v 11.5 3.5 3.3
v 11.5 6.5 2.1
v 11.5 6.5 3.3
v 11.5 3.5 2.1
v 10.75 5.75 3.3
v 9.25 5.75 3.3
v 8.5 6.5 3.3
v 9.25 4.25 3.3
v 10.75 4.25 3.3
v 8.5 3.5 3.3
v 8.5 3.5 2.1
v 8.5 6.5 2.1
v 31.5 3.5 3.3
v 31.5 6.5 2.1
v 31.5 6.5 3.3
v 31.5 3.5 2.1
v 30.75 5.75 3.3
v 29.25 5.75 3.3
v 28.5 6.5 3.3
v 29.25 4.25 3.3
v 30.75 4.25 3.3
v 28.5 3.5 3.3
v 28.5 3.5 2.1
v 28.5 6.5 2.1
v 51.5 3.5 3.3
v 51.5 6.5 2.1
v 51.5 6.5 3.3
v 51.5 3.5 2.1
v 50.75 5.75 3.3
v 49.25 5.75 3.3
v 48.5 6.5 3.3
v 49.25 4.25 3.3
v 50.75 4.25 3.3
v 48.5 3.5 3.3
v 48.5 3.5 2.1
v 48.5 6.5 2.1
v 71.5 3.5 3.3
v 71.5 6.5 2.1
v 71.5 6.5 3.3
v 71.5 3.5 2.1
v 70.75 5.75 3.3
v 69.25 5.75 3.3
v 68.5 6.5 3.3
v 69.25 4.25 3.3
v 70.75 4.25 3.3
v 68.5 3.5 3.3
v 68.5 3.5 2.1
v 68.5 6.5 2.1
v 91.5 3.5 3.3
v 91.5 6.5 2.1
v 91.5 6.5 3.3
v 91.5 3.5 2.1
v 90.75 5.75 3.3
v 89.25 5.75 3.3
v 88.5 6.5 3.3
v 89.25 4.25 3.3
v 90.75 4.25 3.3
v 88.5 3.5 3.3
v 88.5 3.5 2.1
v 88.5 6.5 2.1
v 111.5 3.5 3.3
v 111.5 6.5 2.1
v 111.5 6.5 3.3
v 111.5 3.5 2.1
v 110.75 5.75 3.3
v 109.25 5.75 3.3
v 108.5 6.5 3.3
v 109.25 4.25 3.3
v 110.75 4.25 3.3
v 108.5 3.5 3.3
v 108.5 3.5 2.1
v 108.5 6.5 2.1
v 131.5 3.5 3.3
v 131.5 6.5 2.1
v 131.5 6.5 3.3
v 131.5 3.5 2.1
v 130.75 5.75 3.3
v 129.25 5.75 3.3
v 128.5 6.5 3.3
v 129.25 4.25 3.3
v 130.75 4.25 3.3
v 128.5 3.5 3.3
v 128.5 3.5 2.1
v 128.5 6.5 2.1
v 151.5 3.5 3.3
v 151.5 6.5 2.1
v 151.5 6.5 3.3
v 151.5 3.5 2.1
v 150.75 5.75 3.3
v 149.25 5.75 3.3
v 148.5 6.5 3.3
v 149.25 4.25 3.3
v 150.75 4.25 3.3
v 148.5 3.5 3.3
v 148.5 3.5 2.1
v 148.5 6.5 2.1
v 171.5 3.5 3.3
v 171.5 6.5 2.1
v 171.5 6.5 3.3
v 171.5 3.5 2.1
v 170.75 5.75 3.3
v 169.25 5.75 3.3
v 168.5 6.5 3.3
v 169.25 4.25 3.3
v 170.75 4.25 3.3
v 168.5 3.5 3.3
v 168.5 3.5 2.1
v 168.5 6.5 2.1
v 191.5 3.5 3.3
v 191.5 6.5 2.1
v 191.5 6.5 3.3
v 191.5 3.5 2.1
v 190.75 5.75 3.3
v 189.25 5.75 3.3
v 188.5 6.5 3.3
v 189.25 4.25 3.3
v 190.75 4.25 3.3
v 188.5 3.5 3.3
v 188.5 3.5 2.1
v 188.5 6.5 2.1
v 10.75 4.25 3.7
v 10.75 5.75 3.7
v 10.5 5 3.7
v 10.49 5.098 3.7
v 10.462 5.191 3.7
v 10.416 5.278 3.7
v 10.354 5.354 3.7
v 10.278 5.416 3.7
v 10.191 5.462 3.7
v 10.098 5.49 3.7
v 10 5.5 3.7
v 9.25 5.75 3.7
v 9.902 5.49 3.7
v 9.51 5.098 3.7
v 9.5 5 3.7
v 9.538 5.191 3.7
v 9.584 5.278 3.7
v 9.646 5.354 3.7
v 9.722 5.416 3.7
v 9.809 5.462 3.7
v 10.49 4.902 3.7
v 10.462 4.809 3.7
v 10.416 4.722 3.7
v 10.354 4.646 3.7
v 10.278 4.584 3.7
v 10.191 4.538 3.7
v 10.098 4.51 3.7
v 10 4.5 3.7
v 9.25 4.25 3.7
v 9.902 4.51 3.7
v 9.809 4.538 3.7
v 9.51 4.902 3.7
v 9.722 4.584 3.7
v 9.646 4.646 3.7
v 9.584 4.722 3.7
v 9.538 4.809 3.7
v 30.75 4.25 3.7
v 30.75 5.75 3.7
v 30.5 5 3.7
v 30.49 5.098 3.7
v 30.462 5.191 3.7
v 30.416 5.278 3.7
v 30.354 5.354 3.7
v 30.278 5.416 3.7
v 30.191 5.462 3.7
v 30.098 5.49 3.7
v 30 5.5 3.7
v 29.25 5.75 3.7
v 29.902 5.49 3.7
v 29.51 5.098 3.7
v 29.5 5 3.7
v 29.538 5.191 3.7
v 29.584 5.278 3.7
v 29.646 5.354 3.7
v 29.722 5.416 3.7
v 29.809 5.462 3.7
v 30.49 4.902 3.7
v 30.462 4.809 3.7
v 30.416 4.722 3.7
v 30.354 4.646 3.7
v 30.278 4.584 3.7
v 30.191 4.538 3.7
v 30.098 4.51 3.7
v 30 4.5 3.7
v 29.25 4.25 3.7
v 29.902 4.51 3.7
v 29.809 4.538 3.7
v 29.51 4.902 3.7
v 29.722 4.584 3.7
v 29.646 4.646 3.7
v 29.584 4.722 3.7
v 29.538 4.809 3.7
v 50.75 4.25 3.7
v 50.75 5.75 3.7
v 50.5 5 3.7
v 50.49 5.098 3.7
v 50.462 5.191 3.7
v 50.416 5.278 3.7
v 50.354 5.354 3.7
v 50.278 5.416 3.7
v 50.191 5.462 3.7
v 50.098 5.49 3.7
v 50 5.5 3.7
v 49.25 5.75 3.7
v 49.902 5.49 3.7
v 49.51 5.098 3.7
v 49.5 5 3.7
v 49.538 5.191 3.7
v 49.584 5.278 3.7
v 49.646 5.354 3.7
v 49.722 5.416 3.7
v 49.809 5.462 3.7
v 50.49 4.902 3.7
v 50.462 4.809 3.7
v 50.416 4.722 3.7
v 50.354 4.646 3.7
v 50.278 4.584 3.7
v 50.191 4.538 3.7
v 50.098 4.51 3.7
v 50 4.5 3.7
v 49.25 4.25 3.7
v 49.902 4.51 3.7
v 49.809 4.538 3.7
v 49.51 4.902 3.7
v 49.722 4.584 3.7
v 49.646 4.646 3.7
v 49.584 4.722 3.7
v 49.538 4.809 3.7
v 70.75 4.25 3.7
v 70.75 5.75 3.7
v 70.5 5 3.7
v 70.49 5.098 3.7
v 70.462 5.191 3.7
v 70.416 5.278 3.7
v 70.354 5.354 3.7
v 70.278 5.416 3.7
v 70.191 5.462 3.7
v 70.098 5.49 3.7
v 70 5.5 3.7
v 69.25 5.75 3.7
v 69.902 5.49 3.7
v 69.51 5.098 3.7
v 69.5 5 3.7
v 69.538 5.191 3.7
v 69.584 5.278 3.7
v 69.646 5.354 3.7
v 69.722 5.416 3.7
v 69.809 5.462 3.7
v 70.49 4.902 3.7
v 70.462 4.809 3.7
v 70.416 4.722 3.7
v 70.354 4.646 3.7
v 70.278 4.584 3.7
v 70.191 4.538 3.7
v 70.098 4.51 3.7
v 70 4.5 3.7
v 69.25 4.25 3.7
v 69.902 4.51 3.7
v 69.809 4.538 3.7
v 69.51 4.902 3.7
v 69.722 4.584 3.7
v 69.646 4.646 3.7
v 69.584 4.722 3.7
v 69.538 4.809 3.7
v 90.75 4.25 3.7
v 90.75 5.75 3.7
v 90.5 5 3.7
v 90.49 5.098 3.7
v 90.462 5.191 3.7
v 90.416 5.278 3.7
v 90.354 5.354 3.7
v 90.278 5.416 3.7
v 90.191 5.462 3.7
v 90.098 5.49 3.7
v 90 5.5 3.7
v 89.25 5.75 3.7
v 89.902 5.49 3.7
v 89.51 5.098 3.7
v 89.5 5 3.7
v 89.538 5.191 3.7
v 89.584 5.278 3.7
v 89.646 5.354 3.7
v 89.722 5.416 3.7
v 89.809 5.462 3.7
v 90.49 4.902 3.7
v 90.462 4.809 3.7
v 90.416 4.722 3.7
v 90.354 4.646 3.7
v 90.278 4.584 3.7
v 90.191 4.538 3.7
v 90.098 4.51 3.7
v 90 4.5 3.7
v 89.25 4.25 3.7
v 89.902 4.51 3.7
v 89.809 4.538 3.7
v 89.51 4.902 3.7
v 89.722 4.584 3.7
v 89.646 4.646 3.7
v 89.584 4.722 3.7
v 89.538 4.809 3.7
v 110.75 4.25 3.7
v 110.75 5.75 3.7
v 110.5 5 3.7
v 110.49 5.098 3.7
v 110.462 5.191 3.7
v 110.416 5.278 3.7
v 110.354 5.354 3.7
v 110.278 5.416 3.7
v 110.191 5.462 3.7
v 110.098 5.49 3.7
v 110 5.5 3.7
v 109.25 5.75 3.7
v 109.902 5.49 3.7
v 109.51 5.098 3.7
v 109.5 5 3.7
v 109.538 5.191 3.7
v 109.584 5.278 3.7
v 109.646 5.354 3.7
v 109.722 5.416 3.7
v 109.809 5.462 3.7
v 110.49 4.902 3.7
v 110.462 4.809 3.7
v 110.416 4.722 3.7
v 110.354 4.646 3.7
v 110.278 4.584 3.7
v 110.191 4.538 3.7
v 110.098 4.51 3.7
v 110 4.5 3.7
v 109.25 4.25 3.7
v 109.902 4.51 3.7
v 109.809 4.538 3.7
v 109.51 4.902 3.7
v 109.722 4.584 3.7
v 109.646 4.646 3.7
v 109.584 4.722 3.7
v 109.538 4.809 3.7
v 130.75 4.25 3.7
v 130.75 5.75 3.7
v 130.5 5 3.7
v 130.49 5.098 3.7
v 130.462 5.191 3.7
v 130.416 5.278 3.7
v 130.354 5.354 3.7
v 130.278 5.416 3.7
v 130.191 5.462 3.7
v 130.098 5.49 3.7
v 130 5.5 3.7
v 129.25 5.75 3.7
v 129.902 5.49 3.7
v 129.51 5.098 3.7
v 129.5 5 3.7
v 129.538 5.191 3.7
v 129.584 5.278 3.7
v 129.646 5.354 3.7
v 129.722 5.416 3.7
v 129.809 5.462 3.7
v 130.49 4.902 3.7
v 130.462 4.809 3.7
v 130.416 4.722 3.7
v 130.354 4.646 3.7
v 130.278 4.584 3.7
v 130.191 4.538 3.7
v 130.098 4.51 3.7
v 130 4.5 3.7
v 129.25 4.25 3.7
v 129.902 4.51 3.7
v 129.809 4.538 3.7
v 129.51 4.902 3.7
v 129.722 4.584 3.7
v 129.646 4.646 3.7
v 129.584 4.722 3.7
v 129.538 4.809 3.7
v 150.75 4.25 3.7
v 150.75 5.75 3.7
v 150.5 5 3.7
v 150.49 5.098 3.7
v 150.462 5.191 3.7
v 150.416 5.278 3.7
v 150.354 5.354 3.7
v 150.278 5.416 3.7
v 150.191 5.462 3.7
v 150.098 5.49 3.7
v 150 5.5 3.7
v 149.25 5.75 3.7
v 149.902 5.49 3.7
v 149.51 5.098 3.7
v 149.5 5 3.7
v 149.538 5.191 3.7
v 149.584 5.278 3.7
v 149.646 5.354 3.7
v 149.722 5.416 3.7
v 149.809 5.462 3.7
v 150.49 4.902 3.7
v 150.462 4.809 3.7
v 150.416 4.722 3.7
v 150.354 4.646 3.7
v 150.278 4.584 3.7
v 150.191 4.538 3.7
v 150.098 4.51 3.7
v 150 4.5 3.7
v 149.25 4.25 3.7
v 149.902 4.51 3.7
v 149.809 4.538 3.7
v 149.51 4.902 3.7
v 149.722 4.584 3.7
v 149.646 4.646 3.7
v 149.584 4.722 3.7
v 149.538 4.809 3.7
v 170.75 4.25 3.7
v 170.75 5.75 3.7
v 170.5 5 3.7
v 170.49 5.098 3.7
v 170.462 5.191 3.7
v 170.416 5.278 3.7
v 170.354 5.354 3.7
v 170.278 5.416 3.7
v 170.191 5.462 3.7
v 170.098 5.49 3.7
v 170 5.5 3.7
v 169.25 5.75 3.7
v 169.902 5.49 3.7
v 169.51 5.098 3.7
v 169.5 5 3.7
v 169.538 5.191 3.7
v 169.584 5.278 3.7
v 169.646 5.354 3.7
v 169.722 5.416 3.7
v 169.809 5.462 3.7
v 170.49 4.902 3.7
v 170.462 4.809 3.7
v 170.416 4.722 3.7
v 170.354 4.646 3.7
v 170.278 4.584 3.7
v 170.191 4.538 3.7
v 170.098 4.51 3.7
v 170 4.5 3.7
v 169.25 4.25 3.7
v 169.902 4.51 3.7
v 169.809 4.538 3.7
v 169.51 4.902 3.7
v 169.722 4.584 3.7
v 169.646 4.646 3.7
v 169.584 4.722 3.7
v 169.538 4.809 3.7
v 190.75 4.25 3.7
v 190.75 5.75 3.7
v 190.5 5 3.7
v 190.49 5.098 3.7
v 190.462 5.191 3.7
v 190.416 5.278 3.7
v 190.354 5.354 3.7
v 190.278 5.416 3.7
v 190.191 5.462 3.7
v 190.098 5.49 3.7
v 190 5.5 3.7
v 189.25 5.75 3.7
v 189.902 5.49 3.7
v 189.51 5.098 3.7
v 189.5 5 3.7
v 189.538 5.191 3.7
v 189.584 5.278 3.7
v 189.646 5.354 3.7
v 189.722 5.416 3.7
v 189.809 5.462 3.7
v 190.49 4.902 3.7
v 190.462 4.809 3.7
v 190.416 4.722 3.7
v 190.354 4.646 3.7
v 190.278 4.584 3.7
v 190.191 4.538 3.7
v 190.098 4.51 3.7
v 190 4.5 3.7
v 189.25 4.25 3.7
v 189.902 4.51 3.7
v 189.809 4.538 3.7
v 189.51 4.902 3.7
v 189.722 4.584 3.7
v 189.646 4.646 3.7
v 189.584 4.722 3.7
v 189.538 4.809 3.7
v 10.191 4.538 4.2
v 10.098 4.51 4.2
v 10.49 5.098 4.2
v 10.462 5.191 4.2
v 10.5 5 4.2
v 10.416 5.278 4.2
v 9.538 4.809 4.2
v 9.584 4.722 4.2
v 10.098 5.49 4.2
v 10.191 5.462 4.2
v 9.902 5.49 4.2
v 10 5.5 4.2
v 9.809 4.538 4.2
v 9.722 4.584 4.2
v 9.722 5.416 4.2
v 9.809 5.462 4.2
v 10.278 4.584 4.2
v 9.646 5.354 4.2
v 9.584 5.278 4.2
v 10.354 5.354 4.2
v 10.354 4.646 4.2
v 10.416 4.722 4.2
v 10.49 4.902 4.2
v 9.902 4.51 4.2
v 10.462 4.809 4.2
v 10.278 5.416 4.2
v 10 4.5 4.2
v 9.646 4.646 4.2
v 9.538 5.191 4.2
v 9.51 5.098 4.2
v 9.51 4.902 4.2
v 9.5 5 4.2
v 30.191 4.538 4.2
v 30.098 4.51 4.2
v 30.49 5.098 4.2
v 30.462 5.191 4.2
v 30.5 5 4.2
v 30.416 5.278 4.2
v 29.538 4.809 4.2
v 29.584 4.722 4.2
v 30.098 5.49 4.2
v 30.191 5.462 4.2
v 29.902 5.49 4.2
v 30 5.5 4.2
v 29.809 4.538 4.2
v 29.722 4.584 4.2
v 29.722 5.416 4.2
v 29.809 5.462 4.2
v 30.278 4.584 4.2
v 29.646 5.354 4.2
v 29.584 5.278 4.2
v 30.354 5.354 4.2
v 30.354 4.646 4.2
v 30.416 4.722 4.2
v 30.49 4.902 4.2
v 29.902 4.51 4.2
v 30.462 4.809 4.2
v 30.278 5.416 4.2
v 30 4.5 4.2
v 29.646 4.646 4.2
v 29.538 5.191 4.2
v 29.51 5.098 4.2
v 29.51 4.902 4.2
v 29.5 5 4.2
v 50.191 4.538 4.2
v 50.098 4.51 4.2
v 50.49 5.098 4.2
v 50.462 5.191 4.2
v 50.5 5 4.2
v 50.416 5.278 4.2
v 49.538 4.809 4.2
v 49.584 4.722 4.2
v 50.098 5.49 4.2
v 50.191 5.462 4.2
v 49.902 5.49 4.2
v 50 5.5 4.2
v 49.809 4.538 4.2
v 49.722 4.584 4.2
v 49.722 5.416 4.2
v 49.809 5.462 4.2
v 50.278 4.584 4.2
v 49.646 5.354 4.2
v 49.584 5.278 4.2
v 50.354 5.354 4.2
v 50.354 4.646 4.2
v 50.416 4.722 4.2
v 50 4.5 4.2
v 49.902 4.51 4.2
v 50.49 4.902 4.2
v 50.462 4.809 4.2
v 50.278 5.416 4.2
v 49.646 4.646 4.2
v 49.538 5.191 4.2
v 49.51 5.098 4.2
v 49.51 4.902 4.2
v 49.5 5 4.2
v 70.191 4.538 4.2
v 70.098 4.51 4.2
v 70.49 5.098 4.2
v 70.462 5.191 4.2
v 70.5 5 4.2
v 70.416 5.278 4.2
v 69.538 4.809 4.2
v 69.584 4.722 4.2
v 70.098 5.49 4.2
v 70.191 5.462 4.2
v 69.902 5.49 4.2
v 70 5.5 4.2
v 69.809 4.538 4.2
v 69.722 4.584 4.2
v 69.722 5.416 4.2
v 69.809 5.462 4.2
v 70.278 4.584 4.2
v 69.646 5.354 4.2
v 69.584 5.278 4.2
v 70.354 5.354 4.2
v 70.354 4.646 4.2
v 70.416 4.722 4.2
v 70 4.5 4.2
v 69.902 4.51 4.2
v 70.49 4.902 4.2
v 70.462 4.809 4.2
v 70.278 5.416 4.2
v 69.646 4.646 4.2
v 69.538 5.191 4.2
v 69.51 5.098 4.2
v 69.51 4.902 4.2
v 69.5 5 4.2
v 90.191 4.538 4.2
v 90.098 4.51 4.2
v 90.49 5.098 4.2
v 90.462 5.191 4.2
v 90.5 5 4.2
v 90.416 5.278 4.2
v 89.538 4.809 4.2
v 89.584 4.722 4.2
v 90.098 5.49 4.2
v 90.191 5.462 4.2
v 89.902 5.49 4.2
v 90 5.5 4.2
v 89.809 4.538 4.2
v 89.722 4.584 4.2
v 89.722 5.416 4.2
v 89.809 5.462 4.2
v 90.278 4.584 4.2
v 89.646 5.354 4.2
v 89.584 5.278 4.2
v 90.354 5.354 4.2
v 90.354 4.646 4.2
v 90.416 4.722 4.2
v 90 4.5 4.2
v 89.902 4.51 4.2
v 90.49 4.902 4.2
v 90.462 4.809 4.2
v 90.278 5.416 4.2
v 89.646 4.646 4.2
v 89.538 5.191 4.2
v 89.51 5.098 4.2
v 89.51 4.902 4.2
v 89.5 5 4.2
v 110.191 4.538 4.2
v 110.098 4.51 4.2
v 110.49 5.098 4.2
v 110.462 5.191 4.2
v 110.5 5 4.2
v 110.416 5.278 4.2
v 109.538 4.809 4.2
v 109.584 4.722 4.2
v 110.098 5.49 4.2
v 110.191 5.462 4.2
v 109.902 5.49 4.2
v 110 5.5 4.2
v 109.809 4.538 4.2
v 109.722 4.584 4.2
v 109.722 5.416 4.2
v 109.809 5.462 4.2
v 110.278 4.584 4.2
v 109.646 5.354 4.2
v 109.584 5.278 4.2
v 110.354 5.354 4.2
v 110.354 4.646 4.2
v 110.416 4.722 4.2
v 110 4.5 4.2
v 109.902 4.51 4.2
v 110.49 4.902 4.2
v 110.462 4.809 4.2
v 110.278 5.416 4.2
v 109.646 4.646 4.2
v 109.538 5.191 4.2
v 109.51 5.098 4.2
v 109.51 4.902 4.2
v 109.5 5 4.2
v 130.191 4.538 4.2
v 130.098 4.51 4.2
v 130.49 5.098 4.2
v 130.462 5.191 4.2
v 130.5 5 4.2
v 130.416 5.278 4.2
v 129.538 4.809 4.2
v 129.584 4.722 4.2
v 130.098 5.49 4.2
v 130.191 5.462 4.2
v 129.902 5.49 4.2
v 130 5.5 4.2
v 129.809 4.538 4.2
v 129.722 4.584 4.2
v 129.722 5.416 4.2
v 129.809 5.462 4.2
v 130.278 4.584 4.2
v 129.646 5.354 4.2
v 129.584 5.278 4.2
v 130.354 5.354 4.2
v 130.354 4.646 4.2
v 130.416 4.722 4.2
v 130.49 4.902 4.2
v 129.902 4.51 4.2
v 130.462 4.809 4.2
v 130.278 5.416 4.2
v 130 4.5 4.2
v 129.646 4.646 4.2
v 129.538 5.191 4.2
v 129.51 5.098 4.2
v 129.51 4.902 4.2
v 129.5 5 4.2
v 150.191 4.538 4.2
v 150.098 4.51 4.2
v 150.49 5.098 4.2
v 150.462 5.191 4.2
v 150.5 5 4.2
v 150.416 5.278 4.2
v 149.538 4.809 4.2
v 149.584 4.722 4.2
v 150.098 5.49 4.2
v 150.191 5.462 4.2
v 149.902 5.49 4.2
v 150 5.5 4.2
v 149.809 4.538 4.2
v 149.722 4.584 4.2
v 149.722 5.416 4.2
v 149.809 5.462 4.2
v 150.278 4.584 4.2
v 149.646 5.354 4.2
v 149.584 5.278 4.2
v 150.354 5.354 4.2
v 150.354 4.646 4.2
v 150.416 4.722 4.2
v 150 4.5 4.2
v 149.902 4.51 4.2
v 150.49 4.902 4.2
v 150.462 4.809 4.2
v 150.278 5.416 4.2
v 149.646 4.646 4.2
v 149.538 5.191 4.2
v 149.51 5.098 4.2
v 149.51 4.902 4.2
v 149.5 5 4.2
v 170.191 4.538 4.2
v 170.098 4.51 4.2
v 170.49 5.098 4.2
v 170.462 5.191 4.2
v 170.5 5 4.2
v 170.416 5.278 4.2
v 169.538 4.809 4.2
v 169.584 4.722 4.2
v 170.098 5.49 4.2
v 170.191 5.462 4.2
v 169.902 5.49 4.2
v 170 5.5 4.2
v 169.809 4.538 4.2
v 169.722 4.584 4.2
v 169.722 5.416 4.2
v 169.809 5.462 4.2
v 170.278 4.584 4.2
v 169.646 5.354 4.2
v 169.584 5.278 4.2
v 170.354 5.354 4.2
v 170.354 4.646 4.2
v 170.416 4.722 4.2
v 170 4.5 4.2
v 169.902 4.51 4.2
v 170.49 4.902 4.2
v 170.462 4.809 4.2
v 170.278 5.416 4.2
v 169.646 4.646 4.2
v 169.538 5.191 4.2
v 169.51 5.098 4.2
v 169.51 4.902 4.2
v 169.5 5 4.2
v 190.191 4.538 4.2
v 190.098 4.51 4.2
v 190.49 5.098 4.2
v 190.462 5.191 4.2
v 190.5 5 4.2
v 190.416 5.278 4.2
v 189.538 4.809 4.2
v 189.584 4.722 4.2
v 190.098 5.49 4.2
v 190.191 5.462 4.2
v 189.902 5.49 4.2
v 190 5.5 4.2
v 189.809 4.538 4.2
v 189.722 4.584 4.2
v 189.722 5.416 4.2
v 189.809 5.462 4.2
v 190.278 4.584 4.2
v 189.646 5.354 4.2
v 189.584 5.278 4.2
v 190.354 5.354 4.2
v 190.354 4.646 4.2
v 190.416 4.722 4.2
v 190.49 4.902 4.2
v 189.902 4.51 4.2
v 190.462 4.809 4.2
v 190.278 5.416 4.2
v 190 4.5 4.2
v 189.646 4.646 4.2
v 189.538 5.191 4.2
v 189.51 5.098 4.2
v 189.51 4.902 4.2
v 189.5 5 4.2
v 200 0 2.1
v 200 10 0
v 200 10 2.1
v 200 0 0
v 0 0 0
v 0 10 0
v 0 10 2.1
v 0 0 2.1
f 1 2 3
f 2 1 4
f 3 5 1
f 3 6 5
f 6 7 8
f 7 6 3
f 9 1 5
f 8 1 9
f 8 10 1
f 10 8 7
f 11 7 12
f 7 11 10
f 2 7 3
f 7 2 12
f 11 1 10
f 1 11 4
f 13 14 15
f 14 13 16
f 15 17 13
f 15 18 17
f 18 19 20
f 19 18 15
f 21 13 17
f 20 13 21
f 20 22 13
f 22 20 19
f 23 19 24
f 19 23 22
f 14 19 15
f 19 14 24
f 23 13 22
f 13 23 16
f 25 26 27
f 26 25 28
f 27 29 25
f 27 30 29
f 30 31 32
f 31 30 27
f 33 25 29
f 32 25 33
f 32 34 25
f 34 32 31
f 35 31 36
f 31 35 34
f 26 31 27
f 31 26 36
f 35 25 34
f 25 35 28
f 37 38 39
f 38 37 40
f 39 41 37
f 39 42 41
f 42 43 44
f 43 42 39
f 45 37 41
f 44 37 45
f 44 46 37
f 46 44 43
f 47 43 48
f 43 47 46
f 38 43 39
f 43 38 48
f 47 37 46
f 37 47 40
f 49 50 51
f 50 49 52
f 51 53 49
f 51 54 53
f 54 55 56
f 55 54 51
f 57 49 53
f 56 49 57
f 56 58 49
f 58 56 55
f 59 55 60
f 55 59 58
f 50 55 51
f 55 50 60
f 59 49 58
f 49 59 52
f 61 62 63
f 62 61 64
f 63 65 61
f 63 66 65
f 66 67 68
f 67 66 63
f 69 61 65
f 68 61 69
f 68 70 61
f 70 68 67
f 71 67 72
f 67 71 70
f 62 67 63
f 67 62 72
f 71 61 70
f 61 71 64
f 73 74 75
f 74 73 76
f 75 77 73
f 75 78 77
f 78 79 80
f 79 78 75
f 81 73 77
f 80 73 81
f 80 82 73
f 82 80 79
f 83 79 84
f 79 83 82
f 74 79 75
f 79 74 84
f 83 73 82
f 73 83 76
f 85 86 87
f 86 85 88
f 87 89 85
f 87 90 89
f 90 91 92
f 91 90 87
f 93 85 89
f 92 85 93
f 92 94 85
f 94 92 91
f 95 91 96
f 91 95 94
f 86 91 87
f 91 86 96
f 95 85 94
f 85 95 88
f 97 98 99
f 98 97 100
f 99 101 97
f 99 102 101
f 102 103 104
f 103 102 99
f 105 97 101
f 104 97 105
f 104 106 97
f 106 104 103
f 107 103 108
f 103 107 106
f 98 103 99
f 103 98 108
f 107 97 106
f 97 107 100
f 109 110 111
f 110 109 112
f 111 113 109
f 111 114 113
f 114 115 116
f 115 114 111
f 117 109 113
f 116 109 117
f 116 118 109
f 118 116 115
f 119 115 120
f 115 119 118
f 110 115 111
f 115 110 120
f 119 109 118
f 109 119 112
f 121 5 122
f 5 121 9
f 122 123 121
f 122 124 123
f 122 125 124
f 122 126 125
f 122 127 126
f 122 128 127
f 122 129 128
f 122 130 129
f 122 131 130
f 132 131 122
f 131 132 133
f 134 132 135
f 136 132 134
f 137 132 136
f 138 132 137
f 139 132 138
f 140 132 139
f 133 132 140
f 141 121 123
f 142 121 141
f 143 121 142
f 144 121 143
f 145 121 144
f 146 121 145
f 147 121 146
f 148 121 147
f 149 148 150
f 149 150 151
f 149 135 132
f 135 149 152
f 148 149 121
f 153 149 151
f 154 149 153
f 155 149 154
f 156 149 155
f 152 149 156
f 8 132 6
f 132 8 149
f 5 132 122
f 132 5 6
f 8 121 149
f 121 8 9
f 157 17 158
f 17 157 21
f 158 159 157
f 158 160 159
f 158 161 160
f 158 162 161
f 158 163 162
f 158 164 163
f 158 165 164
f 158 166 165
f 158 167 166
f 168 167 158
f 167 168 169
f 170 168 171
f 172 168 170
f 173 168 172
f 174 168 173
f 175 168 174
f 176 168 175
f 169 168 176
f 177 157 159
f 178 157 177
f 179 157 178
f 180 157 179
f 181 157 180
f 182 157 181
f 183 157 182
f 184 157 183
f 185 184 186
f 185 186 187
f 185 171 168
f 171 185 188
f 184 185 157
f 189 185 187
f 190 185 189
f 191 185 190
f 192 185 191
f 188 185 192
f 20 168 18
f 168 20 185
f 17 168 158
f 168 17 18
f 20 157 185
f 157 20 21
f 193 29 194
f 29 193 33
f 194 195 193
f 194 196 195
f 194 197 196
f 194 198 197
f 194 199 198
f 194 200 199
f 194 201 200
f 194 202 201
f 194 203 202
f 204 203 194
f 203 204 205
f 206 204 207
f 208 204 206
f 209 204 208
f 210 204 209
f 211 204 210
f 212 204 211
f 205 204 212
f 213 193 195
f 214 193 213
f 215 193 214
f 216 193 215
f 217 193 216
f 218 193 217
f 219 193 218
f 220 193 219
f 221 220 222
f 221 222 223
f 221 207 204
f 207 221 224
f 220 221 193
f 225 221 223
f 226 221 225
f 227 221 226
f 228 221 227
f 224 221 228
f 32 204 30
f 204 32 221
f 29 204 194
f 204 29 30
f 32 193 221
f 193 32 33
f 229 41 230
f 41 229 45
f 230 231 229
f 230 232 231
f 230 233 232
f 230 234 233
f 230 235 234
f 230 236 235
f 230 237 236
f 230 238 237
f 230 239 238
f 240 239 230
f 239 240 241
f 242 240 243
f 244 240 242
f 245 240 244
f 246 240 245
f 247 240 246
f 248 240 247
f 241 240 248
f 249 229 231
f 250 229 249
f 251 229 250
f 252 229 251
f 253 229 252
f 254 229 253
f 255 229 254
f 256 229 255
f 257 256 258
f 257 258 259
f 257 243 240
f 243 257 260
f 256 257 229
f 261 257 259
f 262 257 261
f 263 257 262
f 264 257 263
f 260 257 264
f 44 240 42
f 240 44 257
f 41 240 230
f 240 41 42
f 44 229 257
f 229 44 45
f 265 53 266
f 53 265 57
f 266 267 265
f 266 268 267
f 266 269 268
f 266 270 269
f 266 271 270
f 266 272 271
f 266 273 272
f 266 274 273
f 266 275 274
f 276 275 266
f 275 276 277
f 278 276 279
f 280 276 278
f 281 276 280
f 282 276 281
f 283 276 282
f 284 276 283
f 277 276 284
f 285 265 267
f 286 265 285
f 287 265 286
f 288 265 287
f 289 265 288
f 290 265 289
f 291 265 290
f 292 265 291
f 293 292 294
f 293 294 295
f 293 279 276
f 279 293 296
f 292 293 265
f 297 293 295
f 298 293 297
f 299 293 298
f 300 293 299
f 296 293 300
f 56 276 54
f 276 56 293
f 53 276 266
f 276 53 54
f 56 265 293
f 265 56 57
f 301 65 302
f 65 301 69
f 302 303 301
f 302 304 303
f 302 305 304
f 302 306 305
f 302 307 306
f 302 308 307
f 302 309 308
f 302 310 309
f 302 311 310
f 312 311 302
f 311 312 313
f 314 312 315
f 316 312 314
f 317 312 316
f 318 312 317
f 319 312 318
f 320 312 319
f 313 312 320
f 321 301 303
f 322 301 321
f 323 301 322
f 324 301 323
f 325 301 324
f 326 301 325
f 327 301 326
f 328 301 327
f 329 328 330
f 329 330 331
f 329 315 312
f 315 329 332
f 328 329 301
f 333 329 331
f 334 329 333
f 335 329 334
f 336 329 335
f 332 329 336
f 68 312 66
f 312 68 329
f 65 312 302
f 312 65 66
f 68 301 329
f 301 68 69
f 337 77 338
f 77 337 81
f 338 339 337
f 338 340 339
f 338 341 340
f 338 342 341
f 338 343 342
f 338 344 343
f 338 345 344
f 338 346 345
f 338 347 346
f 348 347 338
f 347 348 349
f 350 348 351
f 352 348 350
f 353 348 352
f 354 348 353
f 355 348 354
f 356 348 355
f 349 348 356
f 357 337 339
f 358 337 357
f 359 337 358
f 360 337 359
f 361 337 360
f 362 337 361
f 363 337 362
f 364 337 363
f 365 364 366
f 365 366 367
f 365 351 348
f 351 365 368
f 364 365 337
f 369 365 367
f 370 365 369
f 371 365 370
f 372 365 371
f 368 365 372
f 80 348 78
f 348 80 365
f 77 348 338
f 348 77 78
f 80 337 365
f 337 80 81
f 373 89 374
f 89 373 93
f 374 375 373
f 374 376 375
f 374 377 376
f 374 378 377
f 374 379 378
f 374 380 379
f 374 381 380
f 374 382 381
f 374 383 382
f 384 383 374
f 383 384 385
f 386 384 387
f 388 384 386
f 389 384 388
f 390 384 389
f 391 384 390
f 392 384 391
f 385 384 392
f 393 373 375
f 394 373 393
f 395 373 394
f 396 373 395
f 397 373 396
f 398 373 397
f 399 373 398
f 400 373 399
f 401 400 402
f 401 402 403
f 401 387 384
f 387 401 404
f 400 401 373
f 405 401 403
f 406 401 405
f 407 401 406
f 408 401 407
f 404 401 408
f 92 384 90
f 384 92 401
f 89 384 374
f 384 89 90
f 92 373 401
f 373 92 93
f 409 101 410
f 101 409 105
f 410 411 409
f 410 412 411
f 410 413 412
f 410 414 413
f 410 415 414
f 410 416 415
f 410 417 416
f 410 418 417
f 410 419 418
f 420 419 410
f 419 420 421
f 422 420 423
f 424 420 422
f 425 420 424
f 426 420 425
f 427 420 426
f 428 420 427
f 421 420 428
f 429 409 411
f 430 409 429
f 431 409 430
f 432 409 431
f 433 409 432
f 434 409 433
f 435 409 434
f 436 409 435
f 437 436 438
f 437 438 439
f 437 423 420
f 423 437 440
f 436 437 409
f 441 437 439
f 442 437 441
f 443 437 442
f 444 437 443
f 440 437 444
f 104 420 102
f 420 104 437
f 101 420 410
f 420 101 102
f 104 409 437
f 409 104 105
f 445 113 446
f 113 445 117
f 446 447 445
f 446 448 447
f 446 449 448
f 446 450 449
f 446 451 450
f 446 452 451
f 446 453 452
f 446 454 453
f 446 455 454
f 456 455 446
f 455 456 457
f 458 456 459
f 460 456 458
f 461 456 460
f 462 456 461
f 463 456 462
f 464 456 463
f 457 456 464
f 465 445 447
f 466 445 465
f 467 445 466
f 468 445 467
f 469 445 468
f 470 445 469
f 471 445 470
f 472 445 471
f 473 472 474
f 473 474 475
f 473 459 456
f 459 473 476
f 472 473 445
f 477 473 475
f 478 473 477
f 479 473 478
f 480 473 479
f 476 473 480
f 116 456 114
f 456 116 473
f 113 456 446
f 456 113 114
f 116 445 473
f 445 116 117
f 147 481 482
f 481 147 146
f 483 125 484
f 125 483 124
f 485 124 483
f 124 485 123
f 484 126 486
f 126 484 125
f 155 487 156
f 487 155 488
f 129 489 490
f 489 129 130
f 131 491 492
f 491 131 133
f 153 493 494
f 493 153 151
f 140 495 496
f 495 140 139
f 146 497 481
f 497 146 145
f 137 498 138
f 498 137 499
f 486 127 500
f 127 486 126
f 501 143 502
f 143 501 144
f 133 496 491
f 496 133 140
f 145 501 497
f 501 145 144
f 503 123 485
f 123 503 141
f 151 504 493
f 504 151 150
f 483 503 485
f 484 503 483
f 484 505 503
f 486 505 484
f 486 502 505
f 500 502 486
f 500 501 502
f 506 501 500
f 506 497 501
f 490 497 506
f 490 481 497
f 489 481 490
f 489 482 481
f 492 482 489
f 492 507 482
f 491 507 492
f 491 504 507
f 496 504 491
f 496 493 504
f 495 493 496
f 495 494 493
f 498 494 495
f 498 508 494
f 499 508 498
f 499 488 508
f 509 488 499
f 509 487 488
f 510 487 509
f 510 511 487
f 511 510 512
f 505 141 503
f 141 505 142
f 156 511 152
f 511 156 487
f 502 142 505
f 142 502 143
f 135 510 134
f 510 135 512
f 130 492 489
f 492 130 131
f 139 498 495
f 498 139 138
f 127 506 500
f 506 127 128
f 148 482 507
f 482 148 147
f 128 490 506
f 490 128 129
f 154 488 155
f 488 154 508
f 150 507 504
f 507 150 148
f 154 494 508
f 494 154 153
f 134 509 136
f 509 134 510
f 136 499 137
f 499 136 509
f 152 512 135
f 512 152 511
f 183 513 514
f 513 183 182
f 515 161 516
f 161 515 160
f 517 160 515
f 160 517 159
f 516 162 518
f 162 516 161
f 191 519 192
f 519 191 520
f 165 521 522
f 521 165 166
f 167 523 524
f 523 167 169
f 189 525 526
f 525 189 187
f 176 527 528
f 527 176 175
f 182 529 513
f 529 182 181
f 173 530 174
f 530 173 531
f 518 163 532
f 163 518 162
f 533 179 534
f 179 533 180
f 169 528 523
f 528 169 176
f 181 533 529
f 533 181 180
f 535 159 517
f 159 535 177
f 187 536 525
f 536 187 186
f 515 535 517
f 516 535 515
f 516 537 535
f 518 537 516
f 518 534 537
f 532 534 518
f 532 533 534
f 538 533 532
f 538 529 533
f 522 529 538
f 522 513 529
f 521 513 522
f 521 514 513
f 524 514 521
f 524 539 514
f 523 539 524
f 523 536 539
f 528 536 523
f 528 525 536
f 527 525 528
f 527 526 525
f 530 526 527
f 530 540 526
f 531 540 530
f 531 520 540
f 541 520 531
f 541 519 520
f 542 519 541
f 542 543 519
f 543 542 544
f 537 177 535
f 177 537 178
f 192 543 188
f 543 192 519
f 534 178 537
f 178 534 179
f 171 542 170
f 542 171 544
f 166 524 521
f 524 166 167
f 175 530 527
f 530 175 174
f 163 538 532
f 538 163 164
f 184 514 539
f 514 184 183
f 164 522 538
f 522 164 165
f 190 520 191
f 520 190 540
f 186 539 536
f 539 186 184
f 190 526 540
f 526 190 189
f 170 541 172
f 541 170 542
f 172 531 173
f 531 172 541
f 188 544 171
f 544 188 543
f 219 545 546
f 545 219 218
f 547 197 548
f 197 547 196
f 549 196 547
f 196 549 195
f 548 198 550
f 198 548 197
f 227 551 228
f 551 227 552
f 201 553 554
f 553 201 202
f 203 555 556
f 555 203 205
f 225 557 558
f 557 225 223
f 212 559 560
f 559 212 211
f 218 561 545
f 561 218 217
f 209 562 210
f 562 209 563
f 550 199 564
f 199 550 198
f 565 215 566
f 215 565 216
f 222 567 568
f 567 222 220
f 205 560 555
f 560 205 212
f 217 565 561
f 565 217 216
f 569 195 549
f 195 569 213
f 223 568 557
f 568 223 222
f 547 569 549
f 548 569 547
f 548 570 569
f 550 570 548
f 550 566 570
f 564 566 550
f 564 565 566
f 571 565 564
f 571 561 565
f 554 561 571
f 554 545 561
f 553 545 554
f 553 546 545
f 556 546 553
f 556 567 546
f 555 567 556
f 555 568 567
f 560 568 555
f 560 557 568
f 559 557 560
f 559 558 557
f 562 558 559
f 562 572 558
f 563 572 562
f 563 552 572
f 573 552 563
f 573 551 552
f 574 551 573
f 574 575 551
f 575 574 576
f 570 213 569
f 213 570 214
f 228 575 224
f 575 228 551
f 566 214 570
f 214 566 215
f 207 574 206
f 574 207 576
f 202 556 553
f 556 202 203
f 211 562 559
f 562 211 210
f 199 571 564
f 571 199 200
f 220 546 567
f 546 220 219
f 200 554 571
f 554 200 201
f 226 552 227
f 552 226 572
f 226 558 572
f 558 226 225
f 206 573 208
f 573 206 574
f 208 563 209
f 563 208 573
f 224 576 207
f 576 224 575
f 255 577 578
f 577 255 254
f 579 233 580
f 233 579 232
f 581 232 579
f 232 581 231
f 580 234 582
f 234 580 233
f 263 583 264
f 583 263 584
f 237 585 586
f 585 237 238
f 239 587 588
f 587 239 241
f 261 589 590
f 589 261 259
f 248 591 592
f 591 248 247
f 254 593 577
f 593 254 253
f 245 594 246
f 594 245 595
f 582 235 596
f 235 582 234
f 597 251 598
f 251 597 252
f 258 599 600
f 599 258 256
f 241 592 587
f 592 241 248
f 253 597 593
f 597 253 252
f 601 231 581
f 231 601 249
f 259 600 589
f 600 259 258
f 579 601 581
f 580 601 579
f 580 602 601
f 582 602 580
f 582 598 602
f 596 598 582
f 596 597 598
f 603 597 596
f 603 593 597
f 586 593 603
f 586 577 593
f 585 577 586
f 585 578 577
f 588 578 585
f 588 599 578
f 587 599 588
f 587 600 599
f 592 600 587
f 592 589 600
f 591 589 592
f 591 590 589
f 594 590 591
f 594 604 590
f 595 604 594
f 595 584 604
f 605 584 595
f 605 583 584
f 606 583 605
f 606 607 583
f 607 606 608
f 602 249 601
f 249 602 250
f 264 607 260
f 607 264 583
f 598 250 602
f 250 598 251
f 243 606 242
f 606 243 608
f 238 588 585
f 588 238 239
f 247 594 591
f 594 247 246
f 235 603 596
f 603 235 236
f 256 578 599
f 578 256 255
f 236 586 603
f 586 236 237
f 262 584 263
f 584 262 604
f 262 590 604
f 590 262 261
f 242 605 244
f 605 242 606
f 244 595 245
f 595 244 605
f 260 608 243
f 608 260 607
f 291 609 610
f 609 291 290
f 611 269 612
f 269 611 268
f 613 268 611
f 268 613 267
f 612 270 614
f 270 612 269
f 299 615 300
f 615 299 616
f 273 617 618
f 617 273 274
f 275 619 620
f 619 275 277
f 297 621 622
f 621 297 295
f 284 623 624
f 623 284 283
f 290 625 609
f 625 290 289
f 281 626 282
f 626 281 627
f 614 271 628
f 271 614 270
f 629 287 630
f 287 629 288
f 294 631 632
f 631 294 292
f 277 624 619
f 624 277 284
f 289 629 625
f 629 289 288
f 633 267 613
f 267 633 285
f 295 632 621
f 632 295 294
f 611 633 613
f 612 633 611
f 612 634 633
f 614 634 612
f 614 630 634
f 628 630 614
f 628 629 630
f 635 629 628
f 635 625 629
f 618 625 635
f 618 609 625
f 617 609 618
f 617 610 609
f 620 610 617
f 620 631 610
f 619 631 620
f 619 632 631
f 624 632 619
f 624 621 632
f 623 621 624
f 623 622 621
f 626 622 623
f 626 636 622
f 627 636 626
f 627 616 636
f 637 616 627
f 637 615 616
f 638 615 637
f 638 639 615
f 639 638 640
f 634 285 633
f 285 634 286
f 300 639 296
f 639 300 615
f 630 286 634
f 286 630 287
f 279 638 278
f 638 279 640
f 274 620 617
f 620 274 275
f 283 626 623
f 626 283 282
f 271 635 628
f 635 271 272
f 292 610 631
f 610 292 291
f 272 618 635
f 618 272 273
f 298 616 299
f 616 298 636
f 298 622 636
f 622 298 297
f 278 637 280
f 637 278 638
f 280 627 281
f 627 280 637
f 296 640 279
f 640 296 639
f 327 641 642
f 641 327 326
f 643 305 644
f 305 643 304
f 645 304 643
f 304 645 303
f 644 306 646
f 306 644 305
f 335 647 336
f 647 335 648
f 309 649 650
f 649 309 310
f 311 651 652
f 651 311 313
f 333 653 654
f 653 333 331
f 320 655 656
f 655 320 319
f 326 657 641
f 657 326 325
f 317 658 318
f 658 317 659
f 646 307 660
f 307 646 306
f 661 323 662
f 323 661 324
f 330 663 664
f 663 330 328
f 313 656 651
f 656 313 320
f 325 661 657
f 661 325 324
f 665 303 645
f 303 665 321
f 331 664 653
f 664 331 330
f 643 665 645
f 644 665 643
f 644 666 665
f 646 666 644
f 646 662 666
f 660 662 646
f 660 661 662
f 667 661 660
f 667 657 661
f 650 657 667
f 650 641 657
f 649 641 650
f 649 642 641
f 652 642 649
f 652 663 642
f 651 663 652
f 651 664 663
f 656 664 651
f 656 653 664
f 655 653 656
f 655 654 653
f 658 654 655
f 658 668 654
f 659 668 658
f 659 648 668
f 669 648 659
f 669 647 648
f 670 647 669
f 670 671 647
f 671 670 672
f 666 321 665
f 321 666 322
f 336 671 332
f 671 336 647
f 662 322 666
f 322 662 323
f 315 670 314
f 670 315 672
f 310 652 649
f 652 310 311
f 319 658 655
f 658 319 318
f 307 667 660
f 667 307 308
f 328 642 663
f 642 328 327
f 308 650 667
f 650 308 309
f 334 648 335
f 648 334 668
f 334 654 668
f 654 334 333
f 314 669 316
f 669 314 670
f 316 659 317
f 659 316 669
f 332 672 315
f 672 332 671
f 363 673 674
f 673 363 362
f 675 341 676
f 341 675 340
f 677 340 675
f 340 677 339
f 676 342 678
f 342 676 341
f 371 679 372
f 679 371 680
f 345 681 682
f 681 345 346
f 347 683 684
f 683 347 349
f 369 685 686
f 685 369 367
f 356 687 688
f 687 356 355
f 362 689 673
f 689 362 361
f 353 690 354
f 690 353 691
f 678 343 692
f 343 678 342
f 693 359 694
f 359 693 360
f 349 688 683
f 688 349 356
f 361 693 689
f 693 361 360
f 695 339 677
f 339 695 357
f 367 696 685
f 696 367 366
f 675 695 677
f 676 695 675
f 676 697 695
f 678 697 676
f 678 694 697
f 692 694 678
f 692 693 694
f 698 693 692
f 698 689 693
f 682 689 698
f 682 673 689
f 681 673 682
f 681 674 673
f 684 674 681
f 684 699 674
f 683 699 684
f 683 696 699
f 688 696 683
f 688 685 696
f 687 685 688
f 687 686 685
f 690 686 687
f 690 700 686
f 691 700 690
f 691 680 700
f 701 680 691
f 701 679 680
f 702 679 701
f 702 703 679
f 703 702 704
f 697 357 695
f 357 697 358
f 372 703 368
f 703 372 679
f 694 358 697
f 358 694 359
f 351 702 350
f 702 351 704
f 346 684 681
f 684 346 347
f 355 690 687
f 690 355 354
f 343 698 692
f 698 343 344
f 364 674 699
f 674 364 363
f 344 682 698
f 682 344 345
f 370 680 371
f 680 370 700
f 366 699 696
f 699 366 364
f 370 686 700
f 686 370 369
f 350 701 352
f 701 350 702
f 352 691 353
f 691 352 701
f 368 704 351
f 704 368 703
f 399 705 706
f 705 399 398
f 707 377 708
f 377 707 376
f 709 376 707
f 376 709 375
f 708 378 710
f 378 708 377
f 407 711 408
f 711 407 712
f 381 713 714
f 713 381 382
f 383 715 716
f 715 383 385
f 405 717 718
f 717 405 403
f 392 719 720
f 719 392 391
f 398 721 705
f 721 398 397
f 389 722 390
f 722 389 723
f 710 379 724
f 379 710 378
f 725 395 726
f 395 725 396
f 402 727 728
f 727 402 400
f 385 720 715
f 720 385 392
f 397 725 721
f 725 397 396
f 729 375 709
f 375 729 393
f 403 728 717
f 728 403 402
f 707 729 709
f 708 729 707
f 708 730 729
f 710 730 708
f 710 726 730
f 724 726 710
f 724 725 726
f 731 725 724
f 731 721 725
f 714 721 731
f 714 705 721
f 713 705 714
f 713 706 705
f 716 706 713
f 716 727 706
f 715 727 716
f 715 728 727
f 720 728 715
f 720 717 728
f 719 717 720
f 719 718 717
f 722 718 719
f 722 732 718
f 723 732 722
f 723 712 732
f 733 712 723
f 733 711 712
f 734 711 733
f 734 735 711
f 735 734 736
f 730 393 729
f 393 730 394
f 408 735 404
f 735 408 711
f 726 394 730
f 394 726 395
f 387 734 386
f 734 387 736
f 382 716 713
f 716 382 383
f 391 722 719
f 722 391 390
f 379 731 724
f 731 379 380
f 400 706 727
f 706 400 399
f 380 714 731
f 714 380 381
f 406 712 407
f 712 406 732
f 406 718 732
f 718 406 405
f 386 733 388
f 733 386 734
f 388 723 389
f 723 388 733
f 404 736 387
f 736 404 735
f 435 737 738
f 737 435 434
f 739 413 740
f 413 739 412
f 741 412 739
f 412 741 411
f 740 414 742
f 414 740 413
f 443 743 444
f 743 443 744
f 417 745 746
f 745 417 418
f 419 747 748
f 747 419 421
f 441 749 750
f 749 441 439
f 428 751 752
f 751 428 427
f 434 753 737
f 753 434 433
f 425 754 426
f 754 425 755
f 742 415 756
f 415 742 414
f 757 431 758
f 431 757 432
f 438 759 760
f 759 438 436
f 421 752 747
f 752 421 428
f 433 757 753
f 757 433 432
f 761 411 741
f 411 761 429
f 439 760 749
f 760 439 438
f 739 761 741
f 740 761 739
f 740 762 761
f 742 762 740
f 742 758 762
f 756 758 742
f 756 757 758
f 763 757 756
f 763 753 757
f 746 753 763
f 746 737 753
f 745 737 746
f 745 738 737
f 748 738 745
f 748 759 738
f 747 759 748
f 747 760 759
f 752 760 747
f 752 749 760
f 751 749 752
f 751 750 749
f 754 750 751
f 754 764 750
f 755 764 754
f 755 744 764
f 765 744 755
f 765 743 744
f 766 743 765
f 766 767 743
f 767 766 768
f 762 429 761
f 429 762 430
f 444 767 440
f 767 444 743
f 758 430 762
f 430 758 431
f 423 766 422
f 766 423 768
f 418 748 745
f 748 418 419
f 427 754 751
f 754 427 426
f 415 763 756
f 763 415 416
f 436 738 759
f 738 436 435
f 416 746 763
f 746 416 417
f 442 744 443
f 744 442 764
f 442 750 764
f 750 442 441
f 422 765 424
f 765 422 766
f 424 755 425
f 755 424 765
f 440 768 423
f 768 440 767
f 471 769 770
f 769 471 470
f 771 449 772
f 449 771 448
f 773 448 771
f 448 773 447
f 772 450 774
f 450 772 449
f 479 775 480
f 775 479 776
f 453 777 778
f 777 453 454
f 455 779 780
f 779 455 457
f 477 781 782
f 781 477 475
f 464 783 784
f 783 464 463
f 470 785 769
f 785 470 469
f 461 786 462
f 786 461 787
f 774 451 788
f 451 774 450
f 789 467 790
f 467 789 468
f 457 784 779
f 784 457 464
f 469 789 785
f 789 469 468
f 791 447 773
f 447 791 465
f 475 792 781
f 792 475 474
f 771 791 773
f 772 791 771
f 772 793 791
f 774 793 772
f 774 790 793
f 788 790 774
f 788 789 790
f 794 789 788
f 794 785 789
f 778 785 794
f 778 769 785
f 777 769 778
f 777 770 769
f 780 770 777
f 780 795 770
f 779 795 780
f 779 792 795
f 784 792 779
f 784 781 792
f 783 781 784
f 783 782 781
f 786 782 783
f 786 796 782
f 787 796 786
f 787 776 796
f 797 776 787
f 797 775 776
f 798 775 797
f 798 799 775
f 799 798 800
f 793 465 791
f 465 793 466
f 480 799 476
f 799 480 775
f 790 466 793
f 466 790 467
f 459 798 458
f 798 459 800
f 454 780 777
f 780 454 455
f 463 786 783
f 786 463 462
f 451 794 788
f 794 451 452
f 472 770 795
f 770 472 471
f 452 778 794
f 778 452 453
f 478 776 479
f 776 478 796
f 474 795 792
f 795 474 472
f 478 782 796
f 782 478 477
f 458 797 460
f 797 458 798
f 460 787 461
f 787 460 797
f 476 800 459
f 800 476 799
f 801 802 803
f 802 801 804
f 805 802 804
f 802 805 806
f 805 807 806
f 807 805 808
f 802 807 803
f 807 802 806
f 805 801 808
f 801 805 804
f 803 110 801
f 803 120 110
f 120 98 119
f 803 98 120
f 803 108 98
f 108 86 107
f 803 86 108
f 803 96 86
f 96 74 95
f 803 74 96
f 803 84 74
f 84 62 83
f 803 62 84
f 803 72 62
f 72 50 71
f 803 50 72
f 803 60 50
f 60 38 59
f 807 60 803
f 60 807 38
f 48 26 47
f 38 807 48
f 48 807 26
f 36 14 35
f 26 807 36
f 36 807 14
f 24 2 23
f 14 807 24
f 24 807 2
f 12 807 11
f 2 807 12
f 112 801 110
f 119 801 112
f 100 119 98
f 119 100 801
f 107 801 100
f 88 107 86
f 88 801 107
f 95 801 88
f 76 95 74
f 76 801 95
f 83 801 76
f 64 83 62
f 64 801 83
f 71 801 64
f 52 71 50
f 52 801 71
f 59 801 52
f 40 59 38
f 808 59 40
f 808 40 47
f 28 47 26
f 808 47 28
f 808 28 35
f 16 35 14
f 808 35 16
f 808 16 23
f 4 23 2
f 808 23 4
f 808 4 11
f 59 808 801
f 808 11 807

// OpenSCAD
// Rigid light strip (ONE connected solid, non-zero thickness)

// Parameters
strip_length = 200;      // Length of the rigid strip
strip_width  = 10;       // Width
strip_height = 1.5;      // Base thickness

pcb_thickness = 0.6;     // PCB layer thickness (increased for clearer thickness)

led_spacing = 20;        // Spacing between LEDs
led_size = [3, 3, 1.2];  // LED package size (x,y,z) (slightly thicker)

pad_size = [1.5, 1.5, 0.4]; // Solder pad size (x,y,z) (slightly thicker)
marker_diameter = 1;        // Segment marker diameter
marker_height = 0.5;        // Segment marker height (slightly thicker)

// Small overlap to guarantee watertight union
overlap = 0.1;

// Main assembly (single connected solid)
module light_strip() {
    union() {
        rigid_strip_body();
        pcb_carrier();
        led_packages();
        solder_pads();
        segment_markers();
    }
}

// Rigid strip body (base)
module rigid_strip_body() {
    cube([strip_length, strip_width, strip_height], center=false);
}

// PCB carrier (layer on top of base, overlapping into base)
module pcb_carrier() {
    translate([0, 0, strip_height - overlap])
        cube([strip_length, strip_width, pcb_thickness + overlap], center=false);
}

// LED packages (sit on top of PCB, overlap into PCB)
module led_packages() {
    z0 = strip_height + pcb_thickness - overlap;
    for (i = [0 : led_spacing : strip_length - led_spacing]) {
        translate([
            i + led_spacing/2 - led_size[0]/2,
            strip_width/2 - led_size[1]/2,
            z0
        ])
            cube([led_size[0], led_size[1], led_size[2] + overlap], center=false);
    }
}

// Solder pads (on top of LEDs, overlap into LED)
module solder_pads() {
    z0 = strip_height + pcb_thickness + led_size[2] - overlap;
    for (i = [0 : led_spacing : strip_length - led_spacing]) {
        translate([
            i + led_spacing/2 - pad_size[0]/2,
            strip_width/2 - pad_size[1]/2,
            z0
        ])
            cube([pad_size[0], pad_size[1], pad_size[2] + overlap], center=false);
    }
}

// Segment markers (small cylinders on top of pads, overlap into pads)
module segment_markers() {
    z0 = strip_height + pcb_thickness + led_size[2] + pad_size[2] - overlap;
    for (i = [0 : led_spacing : strip_length - led_spacing]) {
        translate([i + led_spacing/2, strip_width/2, z0])
            cylinder(h=marker_height + overlap, d=marker_diameter, center=false, $fn=32);
    }
}

// Render
light_strip();
